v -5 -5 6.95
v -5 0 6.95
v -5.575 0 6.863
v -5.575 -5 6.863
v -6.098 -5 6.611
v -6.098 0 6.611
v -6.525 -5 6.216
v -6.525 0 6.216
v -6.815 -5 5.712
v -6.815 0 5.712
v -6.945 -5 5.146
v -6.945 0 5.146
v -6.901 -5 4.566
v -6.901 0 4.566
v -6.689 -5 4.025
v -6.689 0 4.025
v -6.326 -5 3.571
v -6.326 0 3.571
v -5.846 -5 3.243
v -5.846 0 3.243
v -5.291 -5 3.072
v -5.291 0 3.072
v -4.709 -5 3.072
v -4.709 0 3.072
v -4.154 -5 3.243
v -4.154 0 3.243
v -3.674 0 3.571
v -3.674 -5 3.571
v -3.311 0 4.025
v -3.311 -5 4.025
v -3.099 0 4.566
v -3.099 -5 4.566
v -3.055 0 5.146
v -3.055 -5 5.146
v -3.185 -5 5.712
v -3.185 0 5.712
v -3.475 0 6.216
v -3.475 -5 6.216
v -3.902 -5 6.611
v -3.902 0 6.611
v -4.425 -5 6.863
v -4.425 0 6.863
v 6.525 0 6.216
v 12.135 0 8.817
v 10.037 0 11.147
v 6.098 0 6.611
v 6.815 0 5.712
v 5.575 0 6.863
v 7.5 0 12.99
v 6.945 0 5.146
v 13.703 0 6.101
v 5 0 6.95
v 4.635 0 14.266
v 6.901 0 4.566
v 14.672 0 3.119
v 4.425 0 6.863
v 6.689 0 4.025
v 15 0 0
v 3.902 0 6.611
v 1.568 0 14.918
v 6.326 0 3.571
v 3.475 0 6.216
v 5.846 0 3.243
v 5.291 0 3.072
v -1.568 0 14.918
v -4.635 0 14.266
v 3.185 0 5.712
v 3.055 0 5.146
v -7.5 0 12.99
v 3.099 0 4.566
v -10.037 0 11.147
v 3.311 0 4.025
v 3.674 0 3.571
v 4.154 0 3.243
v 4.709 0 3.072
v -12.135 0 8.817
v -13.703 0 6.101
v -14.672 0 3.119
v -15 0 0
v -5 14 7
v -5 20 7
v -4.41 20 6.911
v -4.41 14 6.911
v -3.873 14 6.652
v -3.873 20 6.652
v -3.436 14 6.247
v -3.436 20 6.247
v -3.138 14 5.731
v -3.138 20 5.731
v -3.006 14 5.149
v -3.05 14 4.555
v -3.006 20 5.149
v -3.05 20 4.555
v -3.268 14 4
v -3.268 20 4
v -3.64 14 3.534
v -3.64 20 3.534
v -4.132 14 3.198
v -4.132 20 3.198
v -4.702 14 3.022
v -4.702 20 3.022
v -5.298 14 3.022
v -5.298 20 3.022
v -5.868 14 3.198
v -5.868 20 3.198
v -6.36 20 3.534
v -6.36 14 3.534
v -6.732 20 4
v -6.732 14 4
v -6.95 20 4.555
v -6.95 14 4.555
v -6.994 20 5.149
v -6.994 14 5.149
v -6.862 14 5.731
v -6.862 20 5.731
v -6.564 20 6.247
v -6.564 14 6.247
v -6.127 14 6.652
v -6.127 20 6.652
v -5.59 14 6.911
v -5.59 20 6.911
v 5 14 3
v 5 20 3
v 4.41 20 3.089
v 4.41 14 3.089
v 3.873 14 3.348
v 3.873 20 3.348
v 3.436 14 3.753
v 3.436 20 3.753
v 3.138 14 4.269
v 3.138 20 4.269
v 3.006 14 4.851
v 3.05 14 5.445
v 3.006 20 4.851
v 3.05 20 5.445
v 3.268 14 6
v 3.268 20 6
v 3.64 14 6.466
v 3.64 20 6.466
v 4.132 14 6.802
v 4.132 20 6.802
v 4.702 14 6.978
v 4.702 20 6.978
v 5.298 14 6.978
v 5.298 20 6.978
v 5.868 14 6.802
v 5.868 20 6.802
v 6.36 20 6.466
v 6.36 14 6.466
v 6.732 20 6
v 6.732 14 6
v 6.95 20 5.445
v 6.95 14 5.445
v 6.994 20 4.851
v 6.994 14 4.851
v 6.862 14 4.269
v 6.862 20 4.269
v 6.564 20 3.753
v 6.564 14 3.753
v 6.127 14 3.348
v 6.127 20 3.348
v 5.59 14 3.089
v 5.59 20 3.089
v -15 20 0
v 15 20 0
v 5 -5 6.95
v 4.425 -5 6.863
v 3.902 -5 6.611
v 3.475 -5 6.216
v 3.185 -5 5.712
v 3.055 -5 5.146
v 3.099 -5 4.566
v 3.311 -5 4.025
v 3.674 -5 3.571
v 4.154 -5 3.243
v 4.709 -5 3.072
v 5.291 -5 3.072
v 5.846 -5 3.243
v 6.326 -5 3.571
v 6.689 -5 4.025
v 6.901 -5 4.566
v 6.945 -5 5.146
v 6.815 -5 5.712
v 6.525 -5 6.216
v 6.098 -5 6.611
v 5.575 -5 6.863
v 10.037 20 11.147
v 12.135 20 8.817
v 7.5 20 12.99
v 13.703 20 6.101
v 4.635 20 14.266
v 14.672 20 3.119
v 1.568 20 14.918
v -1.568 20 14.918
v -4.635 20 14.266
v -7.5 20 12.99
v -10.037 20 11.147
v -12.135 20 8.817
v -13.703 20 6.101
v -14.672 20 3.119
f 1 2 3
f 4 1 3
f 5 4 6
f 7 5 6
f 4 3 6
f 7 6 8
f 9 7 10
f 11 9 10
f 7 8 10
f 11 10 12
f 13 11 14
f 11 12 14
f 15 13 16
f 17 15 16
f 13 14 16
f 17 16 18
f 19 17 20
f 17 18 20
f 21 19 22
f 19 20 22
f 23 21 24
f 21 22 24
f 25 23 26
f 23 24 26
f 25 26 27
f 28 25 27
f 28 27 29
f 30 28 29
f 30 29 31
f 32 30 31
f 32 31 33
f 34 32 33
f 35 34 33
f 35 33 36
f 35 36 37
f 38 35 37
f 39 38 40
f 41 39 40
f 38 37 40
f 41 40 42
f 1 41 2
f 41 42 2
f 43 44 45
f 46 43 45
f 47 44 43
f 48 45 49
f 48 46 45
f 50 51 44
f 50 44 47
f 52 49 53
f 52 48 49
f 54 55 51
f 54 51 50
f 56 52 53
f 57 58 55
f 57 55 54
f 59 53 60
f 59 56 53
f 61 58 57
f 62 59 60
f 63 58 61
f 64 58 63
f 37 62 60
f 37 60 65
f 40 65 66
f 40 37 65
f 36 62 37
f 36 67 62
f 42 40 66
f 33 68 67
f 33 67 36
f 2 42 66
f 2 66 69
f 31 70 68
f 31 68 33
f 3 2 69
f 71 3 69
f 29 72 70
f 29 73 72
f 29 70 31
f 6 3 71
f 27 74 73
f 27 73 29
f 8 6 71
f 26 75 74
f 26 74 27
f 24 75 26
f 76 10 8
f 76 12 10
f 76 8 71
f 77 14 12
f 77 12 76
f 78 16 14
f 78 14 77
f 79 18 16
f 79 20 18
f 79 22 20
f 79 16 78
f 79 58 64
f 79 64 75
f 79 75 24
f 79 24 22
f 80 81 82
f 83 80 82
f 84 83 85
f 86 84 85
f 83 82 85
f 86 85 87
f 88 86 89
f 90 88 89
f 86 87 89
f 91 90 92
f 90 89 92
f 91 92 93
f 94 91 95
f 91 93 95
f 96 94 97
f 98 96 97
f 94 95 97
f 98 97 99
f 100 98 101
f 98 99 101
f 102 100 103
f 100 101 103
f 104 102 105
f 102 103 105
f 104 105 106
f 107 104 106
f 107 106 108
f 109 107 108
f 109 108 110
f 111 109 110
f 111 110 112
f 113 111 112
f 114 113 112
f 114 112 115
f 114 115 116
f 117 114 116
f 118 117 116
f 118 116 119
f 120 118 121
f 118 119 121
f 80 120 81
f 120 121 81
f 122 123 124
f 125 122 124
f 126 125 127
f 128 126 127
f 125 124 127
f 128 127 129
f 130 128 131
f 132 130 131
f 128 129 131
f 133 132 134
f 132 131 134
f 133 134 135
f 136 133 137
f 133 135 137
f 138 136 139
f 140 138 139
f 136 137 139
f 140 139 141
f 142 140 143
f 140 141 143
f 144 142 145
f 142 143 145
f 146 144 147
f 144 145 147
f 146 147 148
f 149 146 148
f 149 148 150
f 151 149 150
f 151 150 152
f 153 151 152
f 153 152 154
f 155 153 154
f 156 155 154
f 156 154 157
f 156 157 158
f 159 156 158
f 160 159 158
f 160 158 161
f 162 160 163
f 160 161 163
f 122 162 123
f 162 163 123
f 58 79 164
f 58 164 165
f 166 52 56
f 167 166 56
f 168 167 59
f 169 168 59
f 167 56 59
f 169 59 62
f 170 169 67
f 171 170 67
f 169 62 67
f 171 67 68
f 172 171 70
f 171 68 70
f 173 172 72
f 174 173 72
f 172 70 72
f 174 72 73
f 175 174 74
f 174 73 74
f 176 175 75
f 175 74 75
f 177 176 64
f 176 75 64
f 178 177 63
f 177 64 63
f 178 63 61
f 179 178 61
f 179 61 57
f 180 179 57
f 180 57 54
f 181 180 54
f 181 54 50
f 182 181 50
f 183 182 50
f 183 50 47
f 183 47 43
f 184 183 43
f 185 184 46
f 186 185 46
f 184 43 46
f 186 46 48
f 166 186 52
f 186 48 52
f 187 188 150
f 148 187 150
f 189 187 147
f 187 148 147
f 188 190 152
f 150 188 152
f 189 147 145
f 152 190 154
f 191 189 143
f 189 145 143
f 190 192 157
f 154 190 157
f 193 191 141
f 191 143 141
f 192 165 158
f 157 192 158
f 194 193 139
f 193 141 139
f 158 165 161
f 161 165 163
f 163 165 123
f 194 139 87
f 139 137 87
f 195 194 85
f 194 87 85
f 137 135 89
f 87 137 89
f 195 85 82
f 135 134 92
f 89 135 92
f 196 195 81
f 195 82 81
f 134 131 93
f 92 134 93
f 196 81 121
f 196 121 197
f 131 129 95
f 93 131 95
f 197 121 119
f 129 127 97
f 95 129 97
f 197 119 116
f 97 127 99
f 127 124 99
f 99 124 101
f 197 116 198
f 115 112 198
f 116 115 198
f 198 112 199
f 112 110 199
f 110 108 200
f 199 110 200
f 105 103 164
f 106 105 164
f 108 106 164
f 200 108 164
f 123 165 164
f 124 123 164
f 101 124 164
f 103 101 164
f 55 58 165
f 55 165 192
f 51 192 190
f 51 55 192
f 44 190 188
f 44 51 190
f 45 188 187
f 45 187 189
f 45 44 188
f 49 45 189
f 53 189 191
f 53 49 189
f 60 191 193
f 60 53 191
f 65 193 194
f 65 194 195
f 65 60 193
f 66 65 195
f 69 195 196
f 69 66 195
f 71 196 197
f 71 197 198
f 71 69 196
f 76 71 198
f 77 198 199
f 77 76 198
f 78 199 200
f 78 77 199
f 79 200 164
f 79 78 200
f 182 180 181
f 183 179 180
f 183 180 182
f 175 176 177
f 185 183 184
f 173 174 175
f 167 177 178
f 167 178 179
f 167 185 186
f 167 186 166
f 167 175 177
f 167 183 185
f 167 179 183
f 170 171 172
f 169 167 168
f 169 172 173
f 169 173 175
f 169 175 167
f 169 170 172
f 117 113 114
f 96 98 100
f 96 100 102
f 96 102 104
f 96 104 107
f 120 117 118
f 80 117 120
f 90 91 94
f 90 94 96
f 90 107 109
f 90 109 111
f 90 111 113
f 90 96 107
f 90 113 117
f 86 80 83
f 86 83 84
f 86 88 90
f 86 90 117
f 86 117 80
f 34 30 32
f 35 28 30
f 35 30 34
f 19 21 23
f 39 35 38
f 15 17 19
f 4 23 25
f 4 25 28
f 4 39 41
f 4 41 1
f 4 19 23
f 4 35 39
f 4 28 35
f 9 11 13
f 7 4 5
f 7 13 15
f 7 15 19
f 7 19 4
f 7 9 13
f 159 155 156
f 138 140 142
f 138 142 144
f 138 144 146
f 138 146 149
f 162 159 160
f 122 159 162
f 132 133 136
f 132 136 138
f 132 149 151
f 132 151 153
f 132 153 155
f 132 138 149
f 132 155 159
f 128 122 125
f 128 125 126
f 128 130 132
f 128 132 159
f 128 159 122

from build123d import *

# Parameters (mm, degrees)
EXTRUDE_1_DEPTH     = 20
SKETCH_2_R          = 2
CUT_EXTRUDE_1_DEPTH = 6
SKETCH_3_R          = 1.95
EXTRUDE_2_DEPTH     = 5


with BuildPart() as part:
    # 草图1 → 凸台-拉伸1 (new body)
    with BuildSketch(Plane(origin=(0, 0, 0), x_dir=(1, 0, 0), z_dir=(0, 1, 0))):
        with BuildLine():
            Line((-15, 0), (15, 0))
            ThreePointArc((15, 0), (0, -15), (-15, 0))
        make_face()
    extrude(amount=EXTRUDE_1_DEPTH)

    # 草图2 → 切除-拉伸1 (cut)
    with BuildSketch(Plane(origin=(0, 20, 0), x_dir=(1, 0, 0), z_dir=(0, 1, 0))):
        with Locations(Location((-5, -5, 0), (0, 0, 270))):
            Circle(SKETCH_2_R)
        with Locations(Location((5, -5, 0), (0, 0, 90))):
            Circle(SKETCH_2_R)
    extrude(amount=-CUT_EXTRUDE_1_DEPTH, mode=Mode.SUBTRACT)

    # 草图3 → 凸台-拉伸2 (add)
    with BuildSketch(Plane.XZ):
        with Locations(Location((5, 5, 0), (0, 0, 90))):
            Circle(SKETCH_3_R)
        with Locations(Location((-5, 5, 0), (0, 0, 90))):
            Circle(SKETCH_3_R)
    extrude(amount=EXTRUDE_2_DEPTH)


solid = part.part
